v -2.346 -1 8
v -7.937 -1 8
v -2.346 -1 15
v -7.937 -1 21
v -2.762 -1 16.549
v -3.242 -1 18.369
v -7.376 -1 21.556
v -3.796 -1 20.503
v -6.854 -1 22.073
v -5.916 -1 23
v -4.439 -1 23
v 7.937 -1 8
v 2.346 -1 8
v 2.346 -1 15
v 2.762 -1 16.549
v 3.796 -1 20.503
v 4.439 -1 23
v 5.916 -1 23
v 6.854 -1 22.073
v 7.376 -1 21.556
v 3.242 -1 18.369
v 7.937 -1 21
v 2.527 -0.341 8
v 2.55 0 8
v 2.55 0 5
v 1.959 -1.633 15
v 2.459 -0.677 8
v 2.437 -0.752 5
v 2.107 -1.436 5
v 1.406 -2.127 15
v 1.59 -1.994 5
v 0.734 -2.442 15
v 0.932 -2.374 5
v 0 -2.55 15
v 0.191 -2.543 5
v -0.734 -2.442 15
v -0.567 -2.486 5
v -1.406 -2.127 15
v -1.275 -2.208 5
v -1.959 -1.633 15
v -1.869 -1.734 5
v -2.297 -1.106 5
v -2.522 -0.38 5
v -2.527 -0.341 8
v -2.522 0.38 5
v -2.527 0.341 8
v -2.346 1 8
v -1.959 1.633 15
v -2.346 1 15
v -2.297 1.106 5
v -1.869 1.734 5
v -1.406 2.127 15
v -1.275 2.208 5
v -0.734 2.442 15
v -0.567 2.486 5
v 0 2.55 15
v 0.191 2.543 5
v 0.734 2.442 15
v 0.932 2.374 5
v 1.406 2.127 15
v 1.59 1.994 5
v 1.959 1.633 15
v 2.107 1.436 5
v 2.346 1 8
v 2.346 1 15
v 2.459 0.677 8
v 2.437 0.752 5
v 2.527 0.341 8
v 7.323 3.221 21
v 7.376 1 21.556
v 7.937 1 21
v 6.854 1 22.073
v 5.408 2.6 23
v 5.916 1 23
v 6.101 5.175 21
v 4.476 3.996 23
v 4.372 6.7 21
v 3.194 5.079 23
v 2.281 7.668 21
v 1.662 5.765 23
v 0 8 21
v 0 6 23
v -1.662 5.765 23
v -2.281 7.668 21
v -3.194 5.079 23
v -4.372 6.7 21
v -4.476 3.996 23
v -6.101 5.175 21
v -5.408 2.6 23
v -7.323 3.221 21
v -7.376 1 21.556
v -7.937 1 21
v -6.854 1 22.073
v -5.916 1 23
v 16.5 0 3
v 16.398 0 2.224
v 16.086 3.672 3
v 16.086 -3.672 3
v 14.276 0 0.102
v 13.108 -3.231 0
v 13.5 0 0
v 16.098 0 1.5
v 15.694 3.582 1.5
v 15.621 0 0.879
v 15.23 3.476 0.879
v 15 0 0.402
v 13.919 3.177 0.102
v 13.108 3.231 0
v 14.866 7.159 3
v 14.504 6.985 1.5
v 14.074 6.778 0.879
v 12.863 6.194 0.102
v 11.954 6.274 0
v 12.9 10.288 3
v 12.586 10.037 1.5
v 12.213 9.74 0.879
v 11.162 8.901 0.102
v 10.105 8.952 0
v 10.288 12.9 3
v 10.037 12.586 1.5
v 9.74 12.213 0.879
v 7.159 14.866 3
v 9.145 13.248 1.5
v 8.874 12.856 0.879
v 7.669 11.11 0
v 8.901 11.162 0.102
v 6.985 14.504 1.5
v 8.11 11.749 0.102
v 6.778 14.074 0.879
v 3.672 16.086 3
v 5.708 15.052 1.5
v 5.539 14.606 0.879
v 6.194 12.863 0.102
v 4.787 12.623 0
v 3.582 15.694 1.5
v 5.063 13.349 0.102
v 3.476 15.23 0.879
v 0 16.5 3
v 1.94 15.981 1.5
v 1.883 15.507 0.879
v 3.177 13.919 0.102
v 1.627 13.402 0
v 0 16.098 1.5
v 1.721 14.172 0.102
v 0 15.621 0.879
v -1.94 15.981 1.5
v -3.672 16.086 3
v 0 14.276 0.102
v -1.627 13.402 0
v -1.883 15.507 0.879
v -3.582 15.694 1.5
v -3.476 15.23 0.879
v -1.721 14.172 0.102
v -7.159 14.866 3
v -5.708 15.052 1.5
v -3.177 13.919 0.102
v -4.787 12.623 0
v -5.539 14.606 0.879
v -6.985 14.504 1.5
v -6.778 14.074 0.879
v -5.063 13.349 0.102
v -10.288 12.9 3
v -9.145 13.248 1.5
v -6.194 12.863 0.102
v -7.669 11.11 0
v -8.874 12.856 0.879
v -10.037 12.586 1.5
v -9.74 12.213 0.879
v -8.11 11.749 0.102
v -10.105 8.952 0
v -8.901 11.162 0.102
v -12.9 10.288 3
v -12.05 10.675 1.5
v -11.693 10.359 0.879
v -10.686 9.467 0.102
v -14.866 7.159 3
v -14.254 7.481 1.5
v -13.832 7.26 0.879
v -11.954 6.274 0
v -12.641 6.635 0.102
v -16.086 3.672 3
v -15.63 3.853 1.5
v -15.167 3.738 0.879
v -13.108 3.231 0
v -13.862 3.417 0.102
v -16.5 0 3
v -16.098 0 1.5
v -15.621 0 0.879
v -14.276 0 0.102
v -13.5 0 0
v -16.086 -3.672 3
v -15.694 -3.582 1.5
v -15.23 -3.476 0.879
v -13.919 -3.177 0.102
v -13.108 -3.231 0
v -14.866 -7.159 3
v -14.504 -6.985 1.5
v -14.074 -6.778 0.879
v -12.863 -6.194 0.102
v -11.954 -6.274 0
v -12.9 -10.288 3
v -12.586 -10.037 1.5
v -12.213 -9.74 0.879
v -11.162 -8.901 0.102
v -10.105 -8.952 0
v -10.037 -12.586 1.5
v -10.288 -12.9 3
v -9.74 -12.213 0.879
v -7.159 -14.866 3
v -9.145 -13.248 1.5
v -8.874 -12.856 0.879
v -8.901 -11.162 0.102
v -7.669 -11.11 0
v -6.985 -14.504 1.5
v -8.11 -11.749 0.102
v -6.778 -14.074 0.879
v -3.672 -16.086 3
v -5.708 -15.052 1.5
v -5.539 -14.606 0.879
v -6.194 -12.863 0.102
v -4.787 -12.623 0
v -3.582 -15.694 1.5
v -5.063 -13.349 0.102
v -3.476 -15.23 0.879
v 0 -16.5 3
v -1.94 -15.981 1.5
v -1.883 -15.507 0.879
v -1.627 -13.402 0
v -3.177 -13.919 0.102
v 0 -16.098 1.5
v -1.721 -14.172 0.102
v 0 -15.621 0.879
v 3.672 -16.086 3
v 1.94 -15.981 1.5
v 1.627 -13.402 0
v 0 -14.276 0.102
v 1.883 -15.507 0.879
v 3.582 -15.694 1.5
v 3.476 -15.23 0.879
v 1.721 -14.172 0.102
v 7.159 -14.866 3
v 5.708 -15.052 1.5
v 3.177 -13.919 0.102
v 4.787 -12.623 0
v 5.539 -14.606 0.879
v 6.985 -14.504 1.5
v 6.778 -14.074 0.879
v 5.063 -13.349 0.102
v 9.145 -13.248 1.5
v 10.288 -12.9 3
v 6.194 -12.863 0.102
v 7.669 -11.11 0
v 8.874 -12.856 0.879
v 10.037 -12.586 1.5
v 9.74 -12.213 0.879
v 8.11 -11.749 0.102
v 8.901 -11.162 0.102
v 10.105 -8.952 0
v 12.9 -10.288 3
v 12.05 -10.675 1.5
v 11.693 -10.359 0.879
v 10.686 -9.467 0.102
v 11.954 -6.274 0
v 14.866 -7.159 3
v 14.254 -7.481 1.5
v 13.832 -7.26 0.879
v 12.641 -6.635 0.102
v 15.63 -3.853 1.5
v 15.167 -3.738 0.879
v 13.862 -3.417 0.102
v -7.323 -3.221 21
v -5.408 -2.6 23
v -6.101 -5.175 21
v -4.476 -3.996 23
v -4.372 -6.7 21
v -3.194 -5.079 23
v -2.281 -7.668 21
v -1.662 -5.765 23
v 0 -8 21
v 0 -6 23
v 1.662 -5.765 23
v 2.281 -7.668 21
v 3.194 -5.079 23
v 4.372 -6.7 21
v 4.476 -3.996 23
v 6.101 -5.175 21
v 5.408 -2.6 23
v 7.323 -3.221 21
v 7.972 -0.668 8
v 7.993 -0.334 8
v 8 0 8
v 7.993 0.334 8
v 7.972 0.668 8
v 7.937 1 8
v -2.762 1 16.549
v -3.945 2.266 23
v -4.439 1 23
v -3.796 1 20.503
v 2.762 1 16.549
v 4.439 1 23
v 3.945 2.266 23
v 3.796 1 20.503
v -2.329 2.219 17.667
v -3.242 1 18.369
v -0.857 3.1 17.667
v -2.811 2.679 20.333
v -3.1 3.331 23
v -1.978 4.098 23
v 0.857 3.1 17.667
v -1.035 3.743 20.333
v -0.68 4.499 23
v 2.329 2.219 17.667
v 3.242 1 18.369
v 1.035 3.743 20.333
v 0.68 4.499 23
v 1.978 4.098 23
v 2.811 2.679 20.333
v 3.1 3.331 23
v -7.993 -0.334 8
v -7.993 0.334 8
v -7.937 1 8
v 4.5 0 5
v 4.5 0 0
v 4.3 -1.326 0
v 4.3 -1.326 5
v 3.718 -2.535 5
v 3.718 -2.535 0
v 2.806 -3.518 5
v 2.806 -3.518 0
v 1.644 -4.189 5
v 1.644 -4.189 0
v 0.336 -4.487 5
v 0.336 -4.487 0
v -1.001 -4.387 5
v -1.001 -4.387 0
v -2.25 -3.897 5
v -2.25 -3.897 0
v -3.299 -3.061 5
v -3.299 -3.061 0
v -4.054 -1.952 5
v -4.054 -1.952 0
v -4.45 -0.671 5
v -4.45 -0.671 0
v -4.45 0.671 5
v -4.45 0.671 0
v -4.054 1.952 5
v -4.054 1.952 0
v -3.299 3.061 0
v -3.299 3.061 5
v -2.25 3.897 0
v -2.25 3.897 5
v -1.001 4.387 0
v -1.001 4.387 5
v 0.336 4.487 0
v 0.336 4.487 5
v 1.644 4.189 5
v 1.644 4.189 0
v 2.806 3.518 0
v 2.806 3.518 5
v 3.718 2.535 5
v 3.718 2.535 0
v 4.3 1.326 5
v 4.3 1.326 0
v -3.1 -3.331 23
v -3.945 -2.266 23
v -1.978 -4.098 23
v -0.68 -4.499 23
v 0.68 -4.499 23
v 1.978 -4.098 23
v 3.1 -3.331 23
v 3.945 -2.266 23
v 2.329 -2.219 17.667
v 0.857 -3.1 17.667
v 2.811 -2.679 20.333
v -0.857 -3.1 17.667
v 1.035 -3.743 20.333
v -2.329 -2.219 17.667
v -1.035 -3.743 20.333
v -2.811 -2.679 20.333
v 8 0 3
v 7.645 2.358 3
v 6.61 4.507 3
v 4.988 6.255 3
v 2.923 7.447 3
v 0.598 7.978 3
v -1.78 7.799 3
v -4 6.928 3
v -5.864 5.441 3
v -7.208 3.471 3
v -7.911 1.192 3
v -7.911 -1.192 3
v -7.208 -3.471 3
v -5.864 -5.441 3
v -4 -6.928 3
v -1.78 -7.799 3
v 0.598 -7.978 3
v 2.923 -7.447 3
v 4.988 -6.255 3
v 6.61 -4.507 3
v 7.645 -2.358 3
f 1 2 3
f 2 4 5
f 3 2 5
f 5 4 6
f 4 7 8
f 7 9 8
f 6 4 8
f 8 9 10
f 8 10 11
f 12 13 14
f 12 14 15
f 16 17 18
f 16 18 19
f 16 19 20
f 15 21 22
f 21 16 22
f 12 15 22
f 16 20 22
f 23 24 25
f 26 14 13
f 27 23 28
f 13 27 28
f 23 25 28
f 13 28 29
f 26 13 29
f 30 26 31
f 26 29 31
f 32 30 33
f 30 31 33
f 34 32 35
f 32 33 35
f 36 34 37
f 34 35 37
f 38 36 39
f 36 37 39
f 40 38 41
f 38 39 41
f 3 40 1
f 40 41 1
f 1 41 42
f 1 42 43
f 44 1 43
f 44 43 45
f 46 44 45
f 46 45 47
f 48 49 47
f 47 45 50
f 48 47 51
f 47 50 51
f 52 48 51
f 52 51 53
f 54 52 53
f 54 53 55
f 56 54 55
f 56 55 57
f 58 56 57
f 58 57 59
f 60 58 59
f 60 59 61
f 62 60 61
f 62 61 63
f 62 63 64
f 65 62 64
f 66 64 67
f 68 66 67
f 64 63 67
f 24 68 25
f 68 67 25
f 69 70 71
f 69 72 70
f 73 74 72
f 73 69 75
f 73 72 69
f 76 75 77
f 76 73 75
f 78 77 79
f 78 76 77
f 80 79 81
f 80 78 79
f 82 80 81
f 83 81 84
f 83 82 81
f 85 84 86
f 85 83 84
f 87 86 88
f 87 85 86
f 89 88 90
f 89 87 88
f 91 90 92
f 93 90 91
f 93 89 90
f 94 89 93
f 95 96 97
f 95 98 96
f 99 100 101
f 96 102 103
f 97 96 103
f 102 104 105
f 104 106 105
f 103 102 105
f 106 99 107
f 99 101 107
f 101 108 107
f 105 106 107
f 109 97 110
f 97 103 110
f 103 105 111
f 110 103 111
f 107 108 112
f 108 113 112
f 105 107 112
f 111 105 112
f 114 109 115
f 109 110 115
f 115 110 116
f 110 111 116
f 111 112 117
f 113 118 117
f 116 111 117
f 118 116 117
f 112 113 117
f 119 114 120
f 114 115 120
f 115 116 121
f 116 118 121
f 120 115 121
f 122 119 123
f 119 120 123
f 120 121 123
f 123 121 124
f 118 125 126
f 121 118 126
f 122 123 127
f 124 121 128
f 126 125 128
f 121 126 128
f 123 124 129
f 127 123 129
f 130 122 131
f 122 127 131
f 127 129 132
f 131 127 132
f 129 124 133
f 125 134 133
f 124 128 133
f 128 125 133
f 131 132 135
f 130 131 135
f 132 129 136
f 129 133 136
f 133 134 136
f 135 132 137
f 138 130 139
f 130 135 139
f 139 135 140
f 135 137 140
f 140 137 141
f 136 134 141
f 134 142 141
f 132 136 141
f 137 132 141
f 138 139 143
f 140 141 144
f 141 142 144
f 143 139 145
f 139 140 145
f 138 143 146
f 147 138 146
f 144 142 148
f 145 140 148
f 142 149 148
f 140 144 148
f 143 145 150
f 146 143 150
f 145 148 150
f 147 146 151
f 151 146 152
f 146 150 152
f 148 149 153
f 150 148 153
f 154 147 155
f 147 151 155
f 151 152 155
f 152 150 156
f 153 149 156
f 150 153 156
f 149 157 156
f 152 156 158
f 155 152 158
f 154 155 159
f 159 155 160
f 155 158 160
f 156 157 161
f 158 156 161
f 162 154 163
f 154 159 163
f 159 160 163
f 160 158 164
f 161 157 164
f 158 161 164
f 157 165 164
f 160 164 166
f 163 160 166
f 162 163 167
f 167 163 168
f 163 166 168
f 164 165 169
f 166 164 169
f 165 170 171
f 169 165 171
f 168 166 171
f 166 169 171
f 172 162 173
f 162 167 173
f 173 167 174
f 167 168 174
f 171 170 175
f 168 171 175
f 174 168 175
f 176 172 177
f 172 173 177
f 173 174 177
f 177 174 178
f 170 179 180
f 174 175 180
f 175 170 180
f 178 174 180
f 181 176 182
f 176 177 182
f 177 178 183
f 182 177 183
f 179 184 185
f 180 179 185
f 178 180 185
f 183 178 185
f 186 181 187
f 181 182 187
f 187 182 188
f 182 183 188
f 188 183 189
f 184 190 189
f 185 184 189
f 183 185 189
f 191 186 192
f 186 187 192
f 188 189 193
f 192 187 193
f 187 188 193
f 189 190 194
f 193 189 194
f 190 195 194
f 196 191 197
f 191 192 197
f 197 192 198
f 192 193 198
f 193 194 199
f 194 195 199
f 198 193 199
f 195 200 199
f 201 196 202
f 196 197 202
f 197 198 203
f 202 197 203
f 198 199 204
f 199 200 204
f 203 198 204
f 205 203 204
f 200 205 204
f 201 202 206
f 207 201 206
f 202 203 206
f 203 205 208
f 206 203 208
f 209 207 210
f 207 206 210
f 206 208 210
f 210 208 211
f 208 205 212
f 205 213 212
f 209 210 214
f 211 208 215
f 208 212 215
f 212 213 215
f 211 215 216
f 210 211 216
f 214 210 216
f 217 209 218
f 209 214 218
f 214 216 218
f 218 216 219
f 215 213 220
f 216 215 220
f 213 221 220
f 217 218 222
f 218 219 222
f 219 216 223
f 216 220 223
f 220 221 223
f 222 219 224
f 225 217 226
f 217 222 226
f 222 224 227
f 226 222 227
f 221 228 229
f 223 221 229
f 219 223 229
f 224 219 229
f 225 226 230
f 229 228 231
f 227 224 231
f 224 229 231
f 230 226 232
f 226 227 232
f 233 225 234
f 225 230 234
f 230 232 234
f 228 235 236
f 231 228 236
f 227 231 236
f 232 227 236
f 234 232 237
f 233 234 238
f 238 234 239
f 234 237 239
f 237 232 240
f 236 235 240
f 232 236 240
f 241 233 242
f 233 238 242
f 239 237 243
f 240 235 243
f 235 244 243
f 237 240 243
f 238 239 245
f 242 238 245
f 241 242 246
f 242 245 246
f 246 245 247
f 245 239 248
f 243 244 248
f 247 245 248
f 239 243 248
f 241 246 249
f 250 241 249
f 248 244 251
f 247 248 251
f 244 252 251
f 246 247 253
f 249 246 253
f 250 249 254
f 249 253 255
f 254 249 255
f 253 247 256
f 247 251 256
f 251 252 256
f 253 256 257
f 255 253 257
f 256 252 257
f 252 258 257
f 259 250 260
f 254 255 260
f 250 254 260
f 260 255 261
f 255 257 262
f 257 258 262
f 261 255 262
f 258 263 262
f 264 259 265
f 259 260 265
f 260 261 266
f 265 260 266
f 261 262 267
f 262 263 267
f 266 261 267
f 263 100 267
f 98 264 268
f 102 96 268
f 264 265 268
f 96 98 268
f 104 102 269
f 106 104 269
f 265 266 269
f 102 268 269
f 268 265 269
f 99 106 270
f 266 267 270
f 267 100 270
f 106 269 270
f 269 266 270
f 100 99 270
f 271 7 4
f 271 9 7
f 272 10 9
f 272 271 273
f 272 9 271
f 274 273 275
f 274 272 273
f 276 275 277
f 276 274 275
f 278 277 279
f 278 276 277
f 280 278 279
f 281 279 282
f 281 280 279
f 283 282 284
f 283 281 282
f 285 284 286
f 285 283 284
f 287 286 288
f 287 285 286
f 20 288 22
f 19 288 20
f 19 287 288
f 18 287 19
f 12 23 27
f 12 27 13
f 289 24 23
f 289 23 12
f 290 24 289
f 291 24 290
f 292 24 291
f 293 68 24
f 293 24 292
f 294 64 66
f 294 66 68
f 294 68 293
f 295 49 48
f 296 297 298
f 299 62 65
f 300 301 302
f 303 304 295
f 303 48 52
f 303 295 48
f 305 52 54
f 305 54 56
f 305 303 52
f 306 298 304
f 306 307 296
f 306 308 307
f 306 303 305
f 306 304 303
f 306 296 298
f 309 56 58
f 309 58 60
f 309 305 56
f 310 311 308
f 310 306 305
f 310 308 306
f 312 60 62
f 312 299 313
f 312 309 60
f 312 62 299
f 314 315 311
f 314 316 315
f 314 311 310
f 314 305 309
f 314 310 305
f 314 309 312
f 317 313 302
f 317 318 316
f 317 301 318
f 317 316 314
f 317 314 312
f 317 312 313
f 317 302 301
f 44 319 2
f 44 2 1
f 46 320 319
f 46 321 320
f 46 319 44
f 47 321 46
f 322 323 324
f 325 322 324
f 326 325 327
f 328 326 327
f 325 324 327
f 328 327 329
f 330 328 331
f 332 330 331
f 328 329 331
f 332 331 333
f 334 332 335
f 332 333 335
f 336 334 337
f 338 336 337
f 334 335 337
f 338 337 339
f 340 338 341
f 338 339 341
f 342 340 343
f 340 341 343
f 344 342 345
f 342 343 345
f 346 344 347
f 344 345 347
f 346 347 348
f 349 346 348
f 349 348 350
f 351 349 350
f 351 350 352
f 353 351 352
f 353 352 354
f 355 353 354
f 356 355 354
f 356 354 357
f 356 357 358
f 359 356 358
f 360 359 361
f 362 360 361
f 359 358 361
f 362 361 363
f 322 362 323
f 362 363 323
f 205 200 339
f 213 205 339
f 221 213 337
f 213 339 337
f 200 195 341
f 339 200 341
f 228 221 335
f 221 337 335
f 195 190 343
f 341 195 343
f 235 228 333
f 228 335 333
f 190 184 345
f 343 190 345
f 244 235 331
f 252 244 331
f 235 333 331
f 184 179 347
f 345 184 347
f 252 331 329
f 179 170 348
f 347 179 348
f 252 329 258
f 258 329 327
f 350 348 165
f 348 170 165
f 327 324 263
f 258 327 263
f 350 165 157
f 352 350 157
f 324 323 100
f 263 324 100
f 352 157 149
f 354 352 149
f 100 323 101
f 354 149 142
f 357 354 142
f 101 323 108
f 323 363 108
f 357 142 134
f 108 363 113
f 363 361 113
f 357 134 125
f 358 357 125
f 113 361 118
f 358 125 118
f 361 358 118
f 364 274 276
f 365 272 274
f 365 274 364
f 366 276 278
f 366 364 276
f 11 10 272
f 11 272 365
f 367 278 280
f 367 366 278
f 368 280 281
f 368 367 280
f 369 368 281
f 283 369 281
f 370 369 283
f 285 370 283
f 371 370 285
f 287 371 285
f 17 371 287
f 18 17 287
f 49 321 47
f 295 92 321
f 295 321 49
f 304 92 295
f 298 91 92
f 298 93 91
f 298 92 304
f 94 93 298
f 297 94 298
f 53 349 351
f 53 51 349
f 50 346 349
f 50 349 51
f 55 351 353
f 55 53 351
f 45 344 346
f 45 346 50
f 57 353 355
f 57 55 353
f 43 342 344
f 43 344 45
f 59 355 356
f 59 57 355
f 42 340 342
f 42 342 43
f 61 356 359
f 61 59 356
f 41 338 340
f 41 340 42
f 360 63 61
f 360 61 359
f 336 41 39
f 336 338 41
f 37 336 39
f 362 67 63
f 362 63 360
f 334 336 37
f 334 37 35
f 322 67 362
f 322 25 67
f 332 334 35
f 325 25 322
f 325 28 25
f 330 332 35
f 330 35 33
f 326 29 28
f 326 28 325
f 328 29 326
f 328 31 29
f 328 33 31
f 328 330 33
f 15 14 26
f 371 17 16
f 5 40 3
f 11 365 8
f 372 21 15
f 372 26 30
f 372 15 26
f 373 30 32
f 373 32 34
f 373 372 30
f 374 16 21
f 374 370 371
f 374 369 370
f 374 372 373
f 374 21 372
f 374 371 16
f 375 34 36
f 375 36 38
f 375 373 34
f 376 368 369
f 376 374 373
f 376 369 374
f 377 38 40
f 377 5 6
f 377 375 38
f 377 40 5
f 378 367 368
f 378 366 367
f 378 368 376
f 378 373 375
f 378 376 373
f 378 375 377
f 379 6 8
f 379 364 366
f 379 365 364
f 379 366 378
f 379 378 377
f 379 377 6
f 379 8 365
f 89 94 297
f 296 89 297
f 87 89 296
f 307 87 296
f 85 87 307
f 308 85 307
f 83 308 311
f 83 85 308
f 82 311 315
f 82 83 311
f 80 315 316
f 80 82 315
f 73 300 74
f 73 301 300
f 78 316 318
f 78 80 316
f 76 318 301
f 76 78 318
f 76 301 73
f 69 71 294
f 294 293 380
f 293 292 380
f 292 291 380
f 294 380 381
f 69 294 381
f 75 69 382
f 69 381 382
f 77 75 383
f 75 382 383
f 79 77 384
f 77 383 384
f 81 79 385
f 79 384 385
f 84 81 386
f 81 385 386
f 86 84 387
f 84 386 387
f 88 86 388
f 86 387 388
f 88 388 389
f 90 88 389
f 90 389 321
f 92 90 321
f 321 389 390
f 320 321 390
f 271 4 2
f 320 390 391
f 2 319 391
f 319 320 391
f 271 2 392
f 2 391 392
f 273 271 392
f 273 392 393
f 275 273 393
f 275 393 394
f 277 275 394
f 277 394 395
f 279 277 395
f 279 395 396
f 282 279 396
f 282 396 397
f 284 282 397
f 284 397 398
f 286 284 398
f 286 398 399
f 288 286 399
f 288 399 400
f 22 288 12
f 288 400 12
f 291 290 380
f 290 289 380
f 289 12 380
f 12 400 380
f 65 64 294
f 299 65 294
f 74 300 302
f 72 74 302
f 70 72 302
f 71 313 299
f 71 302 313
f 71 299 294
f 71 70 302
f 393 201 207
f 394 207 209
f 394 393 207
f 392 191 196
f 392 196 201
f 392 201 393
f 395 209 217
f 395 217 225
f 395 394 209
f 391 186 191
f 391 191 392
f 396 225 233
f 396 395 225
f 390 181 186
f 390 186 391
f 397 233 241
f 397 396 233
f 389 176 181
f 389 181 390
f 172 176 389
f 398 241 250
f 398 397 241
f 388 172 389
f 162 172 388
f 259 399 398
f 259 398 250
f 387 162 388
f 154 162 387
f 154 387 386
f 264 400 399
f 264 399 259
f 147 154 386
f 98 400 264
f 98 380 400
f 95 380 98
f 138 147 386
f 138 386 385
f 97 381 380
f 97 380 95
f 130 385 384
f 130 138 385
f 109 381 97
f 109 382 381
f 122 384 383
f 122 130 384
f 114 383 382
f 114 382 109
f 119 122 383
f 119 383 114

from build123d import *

# Parameters (mm, degrees)
F0_R      = 16.5
F1_DEPTH  = 3
F2_R      = 8
F3_DEPTH  = 20
F4_R      = 2.55
F5_DEPTH  = 25
F6_R      = 4.5
F7_DEPTH  = 5
F8_W      = 17.7715833097
F8_H      = 2
F9_DEPTH  = 15
F10_R     = 2.99999
F11_SIZE  = 2
F12_SIZE2 = 2
F12_SIZE  = 8


# Not quite as in the source:
# - a fillet or chamfer is up to 0.001 mm smaller than in the source, because OpenCascade refuses the exact size


with BuildPart() as f1:
    # F0 (on Top) → F1 (new body)
    with BuildSketch(Plane.XY):
        Circle(F0_R)
    extrude(amount=F1_DEPTH)

    # F2 (on face) → F3 (join)
    with BuildSketch(Plane.XY.offset(3)):
        Circle(F2_R)
    extrude(amount=F3_DEPTH)

    # F4 (on face) → F5 (cut)
    with BuildSketch(Plane(origin=(0, 0, 0), x_dir=(1, 0, 0), z_dir=(0, 0, -1))):
        Circle(F4_R)
    extrude(amount=-F5_DEPTH, mode=Mode.SUBTRACT)

    # F6 (on face) → F7 (cut)
    with BuildSketch(Plane(origin=(0, 0, 0), x_dir=(1, 0, 0), z_dir=(0, 0, -1))):
        Circle(F6_R)
    extrude(amount=-F7_DEPTH, mode=Mode.SUBTRACT)

    # F8 (on face) → F9 (cut)
    with BuildSketch(Plane.XY.offset(23)):
        Rectangle(F8_W, F8_H)
    extrude(amount=-F9_DEPTH, mode=Mode.SUBTRACT)

    # F10 (radius 3 in the source; OpenCascade refuses exactly that, so slightly less here)
    f10_edges = [f1.edges().sort_by_distance(p)[0] for p in [
        (-16.5, 0, 0),
    ]]
    fillet(f10_edges, radius=F10_R)

    # F11
    f11_edges = [f1.edges().sort_by_distance(p)[0] for p in [
        (0, 8, 23),
        (0, -8, 23),
    ]]
    chamfer(f11_edges, length=F11_SIZE)

    # F12
    f12_edges = [f1.edges().sort_by_distance(p)[0] for p in [
        (0, 2.55, 23),
        (0, -2.55, 23),
    ]]
    f12_side = f1.faces().sort_by_distance((2.498413, 0.510324, 7.806088))[0]
    chamfer(f12_edges, length=F12_SIZE, length2=F12_SIZE2, reference=f12_side)


solid = f1.part
